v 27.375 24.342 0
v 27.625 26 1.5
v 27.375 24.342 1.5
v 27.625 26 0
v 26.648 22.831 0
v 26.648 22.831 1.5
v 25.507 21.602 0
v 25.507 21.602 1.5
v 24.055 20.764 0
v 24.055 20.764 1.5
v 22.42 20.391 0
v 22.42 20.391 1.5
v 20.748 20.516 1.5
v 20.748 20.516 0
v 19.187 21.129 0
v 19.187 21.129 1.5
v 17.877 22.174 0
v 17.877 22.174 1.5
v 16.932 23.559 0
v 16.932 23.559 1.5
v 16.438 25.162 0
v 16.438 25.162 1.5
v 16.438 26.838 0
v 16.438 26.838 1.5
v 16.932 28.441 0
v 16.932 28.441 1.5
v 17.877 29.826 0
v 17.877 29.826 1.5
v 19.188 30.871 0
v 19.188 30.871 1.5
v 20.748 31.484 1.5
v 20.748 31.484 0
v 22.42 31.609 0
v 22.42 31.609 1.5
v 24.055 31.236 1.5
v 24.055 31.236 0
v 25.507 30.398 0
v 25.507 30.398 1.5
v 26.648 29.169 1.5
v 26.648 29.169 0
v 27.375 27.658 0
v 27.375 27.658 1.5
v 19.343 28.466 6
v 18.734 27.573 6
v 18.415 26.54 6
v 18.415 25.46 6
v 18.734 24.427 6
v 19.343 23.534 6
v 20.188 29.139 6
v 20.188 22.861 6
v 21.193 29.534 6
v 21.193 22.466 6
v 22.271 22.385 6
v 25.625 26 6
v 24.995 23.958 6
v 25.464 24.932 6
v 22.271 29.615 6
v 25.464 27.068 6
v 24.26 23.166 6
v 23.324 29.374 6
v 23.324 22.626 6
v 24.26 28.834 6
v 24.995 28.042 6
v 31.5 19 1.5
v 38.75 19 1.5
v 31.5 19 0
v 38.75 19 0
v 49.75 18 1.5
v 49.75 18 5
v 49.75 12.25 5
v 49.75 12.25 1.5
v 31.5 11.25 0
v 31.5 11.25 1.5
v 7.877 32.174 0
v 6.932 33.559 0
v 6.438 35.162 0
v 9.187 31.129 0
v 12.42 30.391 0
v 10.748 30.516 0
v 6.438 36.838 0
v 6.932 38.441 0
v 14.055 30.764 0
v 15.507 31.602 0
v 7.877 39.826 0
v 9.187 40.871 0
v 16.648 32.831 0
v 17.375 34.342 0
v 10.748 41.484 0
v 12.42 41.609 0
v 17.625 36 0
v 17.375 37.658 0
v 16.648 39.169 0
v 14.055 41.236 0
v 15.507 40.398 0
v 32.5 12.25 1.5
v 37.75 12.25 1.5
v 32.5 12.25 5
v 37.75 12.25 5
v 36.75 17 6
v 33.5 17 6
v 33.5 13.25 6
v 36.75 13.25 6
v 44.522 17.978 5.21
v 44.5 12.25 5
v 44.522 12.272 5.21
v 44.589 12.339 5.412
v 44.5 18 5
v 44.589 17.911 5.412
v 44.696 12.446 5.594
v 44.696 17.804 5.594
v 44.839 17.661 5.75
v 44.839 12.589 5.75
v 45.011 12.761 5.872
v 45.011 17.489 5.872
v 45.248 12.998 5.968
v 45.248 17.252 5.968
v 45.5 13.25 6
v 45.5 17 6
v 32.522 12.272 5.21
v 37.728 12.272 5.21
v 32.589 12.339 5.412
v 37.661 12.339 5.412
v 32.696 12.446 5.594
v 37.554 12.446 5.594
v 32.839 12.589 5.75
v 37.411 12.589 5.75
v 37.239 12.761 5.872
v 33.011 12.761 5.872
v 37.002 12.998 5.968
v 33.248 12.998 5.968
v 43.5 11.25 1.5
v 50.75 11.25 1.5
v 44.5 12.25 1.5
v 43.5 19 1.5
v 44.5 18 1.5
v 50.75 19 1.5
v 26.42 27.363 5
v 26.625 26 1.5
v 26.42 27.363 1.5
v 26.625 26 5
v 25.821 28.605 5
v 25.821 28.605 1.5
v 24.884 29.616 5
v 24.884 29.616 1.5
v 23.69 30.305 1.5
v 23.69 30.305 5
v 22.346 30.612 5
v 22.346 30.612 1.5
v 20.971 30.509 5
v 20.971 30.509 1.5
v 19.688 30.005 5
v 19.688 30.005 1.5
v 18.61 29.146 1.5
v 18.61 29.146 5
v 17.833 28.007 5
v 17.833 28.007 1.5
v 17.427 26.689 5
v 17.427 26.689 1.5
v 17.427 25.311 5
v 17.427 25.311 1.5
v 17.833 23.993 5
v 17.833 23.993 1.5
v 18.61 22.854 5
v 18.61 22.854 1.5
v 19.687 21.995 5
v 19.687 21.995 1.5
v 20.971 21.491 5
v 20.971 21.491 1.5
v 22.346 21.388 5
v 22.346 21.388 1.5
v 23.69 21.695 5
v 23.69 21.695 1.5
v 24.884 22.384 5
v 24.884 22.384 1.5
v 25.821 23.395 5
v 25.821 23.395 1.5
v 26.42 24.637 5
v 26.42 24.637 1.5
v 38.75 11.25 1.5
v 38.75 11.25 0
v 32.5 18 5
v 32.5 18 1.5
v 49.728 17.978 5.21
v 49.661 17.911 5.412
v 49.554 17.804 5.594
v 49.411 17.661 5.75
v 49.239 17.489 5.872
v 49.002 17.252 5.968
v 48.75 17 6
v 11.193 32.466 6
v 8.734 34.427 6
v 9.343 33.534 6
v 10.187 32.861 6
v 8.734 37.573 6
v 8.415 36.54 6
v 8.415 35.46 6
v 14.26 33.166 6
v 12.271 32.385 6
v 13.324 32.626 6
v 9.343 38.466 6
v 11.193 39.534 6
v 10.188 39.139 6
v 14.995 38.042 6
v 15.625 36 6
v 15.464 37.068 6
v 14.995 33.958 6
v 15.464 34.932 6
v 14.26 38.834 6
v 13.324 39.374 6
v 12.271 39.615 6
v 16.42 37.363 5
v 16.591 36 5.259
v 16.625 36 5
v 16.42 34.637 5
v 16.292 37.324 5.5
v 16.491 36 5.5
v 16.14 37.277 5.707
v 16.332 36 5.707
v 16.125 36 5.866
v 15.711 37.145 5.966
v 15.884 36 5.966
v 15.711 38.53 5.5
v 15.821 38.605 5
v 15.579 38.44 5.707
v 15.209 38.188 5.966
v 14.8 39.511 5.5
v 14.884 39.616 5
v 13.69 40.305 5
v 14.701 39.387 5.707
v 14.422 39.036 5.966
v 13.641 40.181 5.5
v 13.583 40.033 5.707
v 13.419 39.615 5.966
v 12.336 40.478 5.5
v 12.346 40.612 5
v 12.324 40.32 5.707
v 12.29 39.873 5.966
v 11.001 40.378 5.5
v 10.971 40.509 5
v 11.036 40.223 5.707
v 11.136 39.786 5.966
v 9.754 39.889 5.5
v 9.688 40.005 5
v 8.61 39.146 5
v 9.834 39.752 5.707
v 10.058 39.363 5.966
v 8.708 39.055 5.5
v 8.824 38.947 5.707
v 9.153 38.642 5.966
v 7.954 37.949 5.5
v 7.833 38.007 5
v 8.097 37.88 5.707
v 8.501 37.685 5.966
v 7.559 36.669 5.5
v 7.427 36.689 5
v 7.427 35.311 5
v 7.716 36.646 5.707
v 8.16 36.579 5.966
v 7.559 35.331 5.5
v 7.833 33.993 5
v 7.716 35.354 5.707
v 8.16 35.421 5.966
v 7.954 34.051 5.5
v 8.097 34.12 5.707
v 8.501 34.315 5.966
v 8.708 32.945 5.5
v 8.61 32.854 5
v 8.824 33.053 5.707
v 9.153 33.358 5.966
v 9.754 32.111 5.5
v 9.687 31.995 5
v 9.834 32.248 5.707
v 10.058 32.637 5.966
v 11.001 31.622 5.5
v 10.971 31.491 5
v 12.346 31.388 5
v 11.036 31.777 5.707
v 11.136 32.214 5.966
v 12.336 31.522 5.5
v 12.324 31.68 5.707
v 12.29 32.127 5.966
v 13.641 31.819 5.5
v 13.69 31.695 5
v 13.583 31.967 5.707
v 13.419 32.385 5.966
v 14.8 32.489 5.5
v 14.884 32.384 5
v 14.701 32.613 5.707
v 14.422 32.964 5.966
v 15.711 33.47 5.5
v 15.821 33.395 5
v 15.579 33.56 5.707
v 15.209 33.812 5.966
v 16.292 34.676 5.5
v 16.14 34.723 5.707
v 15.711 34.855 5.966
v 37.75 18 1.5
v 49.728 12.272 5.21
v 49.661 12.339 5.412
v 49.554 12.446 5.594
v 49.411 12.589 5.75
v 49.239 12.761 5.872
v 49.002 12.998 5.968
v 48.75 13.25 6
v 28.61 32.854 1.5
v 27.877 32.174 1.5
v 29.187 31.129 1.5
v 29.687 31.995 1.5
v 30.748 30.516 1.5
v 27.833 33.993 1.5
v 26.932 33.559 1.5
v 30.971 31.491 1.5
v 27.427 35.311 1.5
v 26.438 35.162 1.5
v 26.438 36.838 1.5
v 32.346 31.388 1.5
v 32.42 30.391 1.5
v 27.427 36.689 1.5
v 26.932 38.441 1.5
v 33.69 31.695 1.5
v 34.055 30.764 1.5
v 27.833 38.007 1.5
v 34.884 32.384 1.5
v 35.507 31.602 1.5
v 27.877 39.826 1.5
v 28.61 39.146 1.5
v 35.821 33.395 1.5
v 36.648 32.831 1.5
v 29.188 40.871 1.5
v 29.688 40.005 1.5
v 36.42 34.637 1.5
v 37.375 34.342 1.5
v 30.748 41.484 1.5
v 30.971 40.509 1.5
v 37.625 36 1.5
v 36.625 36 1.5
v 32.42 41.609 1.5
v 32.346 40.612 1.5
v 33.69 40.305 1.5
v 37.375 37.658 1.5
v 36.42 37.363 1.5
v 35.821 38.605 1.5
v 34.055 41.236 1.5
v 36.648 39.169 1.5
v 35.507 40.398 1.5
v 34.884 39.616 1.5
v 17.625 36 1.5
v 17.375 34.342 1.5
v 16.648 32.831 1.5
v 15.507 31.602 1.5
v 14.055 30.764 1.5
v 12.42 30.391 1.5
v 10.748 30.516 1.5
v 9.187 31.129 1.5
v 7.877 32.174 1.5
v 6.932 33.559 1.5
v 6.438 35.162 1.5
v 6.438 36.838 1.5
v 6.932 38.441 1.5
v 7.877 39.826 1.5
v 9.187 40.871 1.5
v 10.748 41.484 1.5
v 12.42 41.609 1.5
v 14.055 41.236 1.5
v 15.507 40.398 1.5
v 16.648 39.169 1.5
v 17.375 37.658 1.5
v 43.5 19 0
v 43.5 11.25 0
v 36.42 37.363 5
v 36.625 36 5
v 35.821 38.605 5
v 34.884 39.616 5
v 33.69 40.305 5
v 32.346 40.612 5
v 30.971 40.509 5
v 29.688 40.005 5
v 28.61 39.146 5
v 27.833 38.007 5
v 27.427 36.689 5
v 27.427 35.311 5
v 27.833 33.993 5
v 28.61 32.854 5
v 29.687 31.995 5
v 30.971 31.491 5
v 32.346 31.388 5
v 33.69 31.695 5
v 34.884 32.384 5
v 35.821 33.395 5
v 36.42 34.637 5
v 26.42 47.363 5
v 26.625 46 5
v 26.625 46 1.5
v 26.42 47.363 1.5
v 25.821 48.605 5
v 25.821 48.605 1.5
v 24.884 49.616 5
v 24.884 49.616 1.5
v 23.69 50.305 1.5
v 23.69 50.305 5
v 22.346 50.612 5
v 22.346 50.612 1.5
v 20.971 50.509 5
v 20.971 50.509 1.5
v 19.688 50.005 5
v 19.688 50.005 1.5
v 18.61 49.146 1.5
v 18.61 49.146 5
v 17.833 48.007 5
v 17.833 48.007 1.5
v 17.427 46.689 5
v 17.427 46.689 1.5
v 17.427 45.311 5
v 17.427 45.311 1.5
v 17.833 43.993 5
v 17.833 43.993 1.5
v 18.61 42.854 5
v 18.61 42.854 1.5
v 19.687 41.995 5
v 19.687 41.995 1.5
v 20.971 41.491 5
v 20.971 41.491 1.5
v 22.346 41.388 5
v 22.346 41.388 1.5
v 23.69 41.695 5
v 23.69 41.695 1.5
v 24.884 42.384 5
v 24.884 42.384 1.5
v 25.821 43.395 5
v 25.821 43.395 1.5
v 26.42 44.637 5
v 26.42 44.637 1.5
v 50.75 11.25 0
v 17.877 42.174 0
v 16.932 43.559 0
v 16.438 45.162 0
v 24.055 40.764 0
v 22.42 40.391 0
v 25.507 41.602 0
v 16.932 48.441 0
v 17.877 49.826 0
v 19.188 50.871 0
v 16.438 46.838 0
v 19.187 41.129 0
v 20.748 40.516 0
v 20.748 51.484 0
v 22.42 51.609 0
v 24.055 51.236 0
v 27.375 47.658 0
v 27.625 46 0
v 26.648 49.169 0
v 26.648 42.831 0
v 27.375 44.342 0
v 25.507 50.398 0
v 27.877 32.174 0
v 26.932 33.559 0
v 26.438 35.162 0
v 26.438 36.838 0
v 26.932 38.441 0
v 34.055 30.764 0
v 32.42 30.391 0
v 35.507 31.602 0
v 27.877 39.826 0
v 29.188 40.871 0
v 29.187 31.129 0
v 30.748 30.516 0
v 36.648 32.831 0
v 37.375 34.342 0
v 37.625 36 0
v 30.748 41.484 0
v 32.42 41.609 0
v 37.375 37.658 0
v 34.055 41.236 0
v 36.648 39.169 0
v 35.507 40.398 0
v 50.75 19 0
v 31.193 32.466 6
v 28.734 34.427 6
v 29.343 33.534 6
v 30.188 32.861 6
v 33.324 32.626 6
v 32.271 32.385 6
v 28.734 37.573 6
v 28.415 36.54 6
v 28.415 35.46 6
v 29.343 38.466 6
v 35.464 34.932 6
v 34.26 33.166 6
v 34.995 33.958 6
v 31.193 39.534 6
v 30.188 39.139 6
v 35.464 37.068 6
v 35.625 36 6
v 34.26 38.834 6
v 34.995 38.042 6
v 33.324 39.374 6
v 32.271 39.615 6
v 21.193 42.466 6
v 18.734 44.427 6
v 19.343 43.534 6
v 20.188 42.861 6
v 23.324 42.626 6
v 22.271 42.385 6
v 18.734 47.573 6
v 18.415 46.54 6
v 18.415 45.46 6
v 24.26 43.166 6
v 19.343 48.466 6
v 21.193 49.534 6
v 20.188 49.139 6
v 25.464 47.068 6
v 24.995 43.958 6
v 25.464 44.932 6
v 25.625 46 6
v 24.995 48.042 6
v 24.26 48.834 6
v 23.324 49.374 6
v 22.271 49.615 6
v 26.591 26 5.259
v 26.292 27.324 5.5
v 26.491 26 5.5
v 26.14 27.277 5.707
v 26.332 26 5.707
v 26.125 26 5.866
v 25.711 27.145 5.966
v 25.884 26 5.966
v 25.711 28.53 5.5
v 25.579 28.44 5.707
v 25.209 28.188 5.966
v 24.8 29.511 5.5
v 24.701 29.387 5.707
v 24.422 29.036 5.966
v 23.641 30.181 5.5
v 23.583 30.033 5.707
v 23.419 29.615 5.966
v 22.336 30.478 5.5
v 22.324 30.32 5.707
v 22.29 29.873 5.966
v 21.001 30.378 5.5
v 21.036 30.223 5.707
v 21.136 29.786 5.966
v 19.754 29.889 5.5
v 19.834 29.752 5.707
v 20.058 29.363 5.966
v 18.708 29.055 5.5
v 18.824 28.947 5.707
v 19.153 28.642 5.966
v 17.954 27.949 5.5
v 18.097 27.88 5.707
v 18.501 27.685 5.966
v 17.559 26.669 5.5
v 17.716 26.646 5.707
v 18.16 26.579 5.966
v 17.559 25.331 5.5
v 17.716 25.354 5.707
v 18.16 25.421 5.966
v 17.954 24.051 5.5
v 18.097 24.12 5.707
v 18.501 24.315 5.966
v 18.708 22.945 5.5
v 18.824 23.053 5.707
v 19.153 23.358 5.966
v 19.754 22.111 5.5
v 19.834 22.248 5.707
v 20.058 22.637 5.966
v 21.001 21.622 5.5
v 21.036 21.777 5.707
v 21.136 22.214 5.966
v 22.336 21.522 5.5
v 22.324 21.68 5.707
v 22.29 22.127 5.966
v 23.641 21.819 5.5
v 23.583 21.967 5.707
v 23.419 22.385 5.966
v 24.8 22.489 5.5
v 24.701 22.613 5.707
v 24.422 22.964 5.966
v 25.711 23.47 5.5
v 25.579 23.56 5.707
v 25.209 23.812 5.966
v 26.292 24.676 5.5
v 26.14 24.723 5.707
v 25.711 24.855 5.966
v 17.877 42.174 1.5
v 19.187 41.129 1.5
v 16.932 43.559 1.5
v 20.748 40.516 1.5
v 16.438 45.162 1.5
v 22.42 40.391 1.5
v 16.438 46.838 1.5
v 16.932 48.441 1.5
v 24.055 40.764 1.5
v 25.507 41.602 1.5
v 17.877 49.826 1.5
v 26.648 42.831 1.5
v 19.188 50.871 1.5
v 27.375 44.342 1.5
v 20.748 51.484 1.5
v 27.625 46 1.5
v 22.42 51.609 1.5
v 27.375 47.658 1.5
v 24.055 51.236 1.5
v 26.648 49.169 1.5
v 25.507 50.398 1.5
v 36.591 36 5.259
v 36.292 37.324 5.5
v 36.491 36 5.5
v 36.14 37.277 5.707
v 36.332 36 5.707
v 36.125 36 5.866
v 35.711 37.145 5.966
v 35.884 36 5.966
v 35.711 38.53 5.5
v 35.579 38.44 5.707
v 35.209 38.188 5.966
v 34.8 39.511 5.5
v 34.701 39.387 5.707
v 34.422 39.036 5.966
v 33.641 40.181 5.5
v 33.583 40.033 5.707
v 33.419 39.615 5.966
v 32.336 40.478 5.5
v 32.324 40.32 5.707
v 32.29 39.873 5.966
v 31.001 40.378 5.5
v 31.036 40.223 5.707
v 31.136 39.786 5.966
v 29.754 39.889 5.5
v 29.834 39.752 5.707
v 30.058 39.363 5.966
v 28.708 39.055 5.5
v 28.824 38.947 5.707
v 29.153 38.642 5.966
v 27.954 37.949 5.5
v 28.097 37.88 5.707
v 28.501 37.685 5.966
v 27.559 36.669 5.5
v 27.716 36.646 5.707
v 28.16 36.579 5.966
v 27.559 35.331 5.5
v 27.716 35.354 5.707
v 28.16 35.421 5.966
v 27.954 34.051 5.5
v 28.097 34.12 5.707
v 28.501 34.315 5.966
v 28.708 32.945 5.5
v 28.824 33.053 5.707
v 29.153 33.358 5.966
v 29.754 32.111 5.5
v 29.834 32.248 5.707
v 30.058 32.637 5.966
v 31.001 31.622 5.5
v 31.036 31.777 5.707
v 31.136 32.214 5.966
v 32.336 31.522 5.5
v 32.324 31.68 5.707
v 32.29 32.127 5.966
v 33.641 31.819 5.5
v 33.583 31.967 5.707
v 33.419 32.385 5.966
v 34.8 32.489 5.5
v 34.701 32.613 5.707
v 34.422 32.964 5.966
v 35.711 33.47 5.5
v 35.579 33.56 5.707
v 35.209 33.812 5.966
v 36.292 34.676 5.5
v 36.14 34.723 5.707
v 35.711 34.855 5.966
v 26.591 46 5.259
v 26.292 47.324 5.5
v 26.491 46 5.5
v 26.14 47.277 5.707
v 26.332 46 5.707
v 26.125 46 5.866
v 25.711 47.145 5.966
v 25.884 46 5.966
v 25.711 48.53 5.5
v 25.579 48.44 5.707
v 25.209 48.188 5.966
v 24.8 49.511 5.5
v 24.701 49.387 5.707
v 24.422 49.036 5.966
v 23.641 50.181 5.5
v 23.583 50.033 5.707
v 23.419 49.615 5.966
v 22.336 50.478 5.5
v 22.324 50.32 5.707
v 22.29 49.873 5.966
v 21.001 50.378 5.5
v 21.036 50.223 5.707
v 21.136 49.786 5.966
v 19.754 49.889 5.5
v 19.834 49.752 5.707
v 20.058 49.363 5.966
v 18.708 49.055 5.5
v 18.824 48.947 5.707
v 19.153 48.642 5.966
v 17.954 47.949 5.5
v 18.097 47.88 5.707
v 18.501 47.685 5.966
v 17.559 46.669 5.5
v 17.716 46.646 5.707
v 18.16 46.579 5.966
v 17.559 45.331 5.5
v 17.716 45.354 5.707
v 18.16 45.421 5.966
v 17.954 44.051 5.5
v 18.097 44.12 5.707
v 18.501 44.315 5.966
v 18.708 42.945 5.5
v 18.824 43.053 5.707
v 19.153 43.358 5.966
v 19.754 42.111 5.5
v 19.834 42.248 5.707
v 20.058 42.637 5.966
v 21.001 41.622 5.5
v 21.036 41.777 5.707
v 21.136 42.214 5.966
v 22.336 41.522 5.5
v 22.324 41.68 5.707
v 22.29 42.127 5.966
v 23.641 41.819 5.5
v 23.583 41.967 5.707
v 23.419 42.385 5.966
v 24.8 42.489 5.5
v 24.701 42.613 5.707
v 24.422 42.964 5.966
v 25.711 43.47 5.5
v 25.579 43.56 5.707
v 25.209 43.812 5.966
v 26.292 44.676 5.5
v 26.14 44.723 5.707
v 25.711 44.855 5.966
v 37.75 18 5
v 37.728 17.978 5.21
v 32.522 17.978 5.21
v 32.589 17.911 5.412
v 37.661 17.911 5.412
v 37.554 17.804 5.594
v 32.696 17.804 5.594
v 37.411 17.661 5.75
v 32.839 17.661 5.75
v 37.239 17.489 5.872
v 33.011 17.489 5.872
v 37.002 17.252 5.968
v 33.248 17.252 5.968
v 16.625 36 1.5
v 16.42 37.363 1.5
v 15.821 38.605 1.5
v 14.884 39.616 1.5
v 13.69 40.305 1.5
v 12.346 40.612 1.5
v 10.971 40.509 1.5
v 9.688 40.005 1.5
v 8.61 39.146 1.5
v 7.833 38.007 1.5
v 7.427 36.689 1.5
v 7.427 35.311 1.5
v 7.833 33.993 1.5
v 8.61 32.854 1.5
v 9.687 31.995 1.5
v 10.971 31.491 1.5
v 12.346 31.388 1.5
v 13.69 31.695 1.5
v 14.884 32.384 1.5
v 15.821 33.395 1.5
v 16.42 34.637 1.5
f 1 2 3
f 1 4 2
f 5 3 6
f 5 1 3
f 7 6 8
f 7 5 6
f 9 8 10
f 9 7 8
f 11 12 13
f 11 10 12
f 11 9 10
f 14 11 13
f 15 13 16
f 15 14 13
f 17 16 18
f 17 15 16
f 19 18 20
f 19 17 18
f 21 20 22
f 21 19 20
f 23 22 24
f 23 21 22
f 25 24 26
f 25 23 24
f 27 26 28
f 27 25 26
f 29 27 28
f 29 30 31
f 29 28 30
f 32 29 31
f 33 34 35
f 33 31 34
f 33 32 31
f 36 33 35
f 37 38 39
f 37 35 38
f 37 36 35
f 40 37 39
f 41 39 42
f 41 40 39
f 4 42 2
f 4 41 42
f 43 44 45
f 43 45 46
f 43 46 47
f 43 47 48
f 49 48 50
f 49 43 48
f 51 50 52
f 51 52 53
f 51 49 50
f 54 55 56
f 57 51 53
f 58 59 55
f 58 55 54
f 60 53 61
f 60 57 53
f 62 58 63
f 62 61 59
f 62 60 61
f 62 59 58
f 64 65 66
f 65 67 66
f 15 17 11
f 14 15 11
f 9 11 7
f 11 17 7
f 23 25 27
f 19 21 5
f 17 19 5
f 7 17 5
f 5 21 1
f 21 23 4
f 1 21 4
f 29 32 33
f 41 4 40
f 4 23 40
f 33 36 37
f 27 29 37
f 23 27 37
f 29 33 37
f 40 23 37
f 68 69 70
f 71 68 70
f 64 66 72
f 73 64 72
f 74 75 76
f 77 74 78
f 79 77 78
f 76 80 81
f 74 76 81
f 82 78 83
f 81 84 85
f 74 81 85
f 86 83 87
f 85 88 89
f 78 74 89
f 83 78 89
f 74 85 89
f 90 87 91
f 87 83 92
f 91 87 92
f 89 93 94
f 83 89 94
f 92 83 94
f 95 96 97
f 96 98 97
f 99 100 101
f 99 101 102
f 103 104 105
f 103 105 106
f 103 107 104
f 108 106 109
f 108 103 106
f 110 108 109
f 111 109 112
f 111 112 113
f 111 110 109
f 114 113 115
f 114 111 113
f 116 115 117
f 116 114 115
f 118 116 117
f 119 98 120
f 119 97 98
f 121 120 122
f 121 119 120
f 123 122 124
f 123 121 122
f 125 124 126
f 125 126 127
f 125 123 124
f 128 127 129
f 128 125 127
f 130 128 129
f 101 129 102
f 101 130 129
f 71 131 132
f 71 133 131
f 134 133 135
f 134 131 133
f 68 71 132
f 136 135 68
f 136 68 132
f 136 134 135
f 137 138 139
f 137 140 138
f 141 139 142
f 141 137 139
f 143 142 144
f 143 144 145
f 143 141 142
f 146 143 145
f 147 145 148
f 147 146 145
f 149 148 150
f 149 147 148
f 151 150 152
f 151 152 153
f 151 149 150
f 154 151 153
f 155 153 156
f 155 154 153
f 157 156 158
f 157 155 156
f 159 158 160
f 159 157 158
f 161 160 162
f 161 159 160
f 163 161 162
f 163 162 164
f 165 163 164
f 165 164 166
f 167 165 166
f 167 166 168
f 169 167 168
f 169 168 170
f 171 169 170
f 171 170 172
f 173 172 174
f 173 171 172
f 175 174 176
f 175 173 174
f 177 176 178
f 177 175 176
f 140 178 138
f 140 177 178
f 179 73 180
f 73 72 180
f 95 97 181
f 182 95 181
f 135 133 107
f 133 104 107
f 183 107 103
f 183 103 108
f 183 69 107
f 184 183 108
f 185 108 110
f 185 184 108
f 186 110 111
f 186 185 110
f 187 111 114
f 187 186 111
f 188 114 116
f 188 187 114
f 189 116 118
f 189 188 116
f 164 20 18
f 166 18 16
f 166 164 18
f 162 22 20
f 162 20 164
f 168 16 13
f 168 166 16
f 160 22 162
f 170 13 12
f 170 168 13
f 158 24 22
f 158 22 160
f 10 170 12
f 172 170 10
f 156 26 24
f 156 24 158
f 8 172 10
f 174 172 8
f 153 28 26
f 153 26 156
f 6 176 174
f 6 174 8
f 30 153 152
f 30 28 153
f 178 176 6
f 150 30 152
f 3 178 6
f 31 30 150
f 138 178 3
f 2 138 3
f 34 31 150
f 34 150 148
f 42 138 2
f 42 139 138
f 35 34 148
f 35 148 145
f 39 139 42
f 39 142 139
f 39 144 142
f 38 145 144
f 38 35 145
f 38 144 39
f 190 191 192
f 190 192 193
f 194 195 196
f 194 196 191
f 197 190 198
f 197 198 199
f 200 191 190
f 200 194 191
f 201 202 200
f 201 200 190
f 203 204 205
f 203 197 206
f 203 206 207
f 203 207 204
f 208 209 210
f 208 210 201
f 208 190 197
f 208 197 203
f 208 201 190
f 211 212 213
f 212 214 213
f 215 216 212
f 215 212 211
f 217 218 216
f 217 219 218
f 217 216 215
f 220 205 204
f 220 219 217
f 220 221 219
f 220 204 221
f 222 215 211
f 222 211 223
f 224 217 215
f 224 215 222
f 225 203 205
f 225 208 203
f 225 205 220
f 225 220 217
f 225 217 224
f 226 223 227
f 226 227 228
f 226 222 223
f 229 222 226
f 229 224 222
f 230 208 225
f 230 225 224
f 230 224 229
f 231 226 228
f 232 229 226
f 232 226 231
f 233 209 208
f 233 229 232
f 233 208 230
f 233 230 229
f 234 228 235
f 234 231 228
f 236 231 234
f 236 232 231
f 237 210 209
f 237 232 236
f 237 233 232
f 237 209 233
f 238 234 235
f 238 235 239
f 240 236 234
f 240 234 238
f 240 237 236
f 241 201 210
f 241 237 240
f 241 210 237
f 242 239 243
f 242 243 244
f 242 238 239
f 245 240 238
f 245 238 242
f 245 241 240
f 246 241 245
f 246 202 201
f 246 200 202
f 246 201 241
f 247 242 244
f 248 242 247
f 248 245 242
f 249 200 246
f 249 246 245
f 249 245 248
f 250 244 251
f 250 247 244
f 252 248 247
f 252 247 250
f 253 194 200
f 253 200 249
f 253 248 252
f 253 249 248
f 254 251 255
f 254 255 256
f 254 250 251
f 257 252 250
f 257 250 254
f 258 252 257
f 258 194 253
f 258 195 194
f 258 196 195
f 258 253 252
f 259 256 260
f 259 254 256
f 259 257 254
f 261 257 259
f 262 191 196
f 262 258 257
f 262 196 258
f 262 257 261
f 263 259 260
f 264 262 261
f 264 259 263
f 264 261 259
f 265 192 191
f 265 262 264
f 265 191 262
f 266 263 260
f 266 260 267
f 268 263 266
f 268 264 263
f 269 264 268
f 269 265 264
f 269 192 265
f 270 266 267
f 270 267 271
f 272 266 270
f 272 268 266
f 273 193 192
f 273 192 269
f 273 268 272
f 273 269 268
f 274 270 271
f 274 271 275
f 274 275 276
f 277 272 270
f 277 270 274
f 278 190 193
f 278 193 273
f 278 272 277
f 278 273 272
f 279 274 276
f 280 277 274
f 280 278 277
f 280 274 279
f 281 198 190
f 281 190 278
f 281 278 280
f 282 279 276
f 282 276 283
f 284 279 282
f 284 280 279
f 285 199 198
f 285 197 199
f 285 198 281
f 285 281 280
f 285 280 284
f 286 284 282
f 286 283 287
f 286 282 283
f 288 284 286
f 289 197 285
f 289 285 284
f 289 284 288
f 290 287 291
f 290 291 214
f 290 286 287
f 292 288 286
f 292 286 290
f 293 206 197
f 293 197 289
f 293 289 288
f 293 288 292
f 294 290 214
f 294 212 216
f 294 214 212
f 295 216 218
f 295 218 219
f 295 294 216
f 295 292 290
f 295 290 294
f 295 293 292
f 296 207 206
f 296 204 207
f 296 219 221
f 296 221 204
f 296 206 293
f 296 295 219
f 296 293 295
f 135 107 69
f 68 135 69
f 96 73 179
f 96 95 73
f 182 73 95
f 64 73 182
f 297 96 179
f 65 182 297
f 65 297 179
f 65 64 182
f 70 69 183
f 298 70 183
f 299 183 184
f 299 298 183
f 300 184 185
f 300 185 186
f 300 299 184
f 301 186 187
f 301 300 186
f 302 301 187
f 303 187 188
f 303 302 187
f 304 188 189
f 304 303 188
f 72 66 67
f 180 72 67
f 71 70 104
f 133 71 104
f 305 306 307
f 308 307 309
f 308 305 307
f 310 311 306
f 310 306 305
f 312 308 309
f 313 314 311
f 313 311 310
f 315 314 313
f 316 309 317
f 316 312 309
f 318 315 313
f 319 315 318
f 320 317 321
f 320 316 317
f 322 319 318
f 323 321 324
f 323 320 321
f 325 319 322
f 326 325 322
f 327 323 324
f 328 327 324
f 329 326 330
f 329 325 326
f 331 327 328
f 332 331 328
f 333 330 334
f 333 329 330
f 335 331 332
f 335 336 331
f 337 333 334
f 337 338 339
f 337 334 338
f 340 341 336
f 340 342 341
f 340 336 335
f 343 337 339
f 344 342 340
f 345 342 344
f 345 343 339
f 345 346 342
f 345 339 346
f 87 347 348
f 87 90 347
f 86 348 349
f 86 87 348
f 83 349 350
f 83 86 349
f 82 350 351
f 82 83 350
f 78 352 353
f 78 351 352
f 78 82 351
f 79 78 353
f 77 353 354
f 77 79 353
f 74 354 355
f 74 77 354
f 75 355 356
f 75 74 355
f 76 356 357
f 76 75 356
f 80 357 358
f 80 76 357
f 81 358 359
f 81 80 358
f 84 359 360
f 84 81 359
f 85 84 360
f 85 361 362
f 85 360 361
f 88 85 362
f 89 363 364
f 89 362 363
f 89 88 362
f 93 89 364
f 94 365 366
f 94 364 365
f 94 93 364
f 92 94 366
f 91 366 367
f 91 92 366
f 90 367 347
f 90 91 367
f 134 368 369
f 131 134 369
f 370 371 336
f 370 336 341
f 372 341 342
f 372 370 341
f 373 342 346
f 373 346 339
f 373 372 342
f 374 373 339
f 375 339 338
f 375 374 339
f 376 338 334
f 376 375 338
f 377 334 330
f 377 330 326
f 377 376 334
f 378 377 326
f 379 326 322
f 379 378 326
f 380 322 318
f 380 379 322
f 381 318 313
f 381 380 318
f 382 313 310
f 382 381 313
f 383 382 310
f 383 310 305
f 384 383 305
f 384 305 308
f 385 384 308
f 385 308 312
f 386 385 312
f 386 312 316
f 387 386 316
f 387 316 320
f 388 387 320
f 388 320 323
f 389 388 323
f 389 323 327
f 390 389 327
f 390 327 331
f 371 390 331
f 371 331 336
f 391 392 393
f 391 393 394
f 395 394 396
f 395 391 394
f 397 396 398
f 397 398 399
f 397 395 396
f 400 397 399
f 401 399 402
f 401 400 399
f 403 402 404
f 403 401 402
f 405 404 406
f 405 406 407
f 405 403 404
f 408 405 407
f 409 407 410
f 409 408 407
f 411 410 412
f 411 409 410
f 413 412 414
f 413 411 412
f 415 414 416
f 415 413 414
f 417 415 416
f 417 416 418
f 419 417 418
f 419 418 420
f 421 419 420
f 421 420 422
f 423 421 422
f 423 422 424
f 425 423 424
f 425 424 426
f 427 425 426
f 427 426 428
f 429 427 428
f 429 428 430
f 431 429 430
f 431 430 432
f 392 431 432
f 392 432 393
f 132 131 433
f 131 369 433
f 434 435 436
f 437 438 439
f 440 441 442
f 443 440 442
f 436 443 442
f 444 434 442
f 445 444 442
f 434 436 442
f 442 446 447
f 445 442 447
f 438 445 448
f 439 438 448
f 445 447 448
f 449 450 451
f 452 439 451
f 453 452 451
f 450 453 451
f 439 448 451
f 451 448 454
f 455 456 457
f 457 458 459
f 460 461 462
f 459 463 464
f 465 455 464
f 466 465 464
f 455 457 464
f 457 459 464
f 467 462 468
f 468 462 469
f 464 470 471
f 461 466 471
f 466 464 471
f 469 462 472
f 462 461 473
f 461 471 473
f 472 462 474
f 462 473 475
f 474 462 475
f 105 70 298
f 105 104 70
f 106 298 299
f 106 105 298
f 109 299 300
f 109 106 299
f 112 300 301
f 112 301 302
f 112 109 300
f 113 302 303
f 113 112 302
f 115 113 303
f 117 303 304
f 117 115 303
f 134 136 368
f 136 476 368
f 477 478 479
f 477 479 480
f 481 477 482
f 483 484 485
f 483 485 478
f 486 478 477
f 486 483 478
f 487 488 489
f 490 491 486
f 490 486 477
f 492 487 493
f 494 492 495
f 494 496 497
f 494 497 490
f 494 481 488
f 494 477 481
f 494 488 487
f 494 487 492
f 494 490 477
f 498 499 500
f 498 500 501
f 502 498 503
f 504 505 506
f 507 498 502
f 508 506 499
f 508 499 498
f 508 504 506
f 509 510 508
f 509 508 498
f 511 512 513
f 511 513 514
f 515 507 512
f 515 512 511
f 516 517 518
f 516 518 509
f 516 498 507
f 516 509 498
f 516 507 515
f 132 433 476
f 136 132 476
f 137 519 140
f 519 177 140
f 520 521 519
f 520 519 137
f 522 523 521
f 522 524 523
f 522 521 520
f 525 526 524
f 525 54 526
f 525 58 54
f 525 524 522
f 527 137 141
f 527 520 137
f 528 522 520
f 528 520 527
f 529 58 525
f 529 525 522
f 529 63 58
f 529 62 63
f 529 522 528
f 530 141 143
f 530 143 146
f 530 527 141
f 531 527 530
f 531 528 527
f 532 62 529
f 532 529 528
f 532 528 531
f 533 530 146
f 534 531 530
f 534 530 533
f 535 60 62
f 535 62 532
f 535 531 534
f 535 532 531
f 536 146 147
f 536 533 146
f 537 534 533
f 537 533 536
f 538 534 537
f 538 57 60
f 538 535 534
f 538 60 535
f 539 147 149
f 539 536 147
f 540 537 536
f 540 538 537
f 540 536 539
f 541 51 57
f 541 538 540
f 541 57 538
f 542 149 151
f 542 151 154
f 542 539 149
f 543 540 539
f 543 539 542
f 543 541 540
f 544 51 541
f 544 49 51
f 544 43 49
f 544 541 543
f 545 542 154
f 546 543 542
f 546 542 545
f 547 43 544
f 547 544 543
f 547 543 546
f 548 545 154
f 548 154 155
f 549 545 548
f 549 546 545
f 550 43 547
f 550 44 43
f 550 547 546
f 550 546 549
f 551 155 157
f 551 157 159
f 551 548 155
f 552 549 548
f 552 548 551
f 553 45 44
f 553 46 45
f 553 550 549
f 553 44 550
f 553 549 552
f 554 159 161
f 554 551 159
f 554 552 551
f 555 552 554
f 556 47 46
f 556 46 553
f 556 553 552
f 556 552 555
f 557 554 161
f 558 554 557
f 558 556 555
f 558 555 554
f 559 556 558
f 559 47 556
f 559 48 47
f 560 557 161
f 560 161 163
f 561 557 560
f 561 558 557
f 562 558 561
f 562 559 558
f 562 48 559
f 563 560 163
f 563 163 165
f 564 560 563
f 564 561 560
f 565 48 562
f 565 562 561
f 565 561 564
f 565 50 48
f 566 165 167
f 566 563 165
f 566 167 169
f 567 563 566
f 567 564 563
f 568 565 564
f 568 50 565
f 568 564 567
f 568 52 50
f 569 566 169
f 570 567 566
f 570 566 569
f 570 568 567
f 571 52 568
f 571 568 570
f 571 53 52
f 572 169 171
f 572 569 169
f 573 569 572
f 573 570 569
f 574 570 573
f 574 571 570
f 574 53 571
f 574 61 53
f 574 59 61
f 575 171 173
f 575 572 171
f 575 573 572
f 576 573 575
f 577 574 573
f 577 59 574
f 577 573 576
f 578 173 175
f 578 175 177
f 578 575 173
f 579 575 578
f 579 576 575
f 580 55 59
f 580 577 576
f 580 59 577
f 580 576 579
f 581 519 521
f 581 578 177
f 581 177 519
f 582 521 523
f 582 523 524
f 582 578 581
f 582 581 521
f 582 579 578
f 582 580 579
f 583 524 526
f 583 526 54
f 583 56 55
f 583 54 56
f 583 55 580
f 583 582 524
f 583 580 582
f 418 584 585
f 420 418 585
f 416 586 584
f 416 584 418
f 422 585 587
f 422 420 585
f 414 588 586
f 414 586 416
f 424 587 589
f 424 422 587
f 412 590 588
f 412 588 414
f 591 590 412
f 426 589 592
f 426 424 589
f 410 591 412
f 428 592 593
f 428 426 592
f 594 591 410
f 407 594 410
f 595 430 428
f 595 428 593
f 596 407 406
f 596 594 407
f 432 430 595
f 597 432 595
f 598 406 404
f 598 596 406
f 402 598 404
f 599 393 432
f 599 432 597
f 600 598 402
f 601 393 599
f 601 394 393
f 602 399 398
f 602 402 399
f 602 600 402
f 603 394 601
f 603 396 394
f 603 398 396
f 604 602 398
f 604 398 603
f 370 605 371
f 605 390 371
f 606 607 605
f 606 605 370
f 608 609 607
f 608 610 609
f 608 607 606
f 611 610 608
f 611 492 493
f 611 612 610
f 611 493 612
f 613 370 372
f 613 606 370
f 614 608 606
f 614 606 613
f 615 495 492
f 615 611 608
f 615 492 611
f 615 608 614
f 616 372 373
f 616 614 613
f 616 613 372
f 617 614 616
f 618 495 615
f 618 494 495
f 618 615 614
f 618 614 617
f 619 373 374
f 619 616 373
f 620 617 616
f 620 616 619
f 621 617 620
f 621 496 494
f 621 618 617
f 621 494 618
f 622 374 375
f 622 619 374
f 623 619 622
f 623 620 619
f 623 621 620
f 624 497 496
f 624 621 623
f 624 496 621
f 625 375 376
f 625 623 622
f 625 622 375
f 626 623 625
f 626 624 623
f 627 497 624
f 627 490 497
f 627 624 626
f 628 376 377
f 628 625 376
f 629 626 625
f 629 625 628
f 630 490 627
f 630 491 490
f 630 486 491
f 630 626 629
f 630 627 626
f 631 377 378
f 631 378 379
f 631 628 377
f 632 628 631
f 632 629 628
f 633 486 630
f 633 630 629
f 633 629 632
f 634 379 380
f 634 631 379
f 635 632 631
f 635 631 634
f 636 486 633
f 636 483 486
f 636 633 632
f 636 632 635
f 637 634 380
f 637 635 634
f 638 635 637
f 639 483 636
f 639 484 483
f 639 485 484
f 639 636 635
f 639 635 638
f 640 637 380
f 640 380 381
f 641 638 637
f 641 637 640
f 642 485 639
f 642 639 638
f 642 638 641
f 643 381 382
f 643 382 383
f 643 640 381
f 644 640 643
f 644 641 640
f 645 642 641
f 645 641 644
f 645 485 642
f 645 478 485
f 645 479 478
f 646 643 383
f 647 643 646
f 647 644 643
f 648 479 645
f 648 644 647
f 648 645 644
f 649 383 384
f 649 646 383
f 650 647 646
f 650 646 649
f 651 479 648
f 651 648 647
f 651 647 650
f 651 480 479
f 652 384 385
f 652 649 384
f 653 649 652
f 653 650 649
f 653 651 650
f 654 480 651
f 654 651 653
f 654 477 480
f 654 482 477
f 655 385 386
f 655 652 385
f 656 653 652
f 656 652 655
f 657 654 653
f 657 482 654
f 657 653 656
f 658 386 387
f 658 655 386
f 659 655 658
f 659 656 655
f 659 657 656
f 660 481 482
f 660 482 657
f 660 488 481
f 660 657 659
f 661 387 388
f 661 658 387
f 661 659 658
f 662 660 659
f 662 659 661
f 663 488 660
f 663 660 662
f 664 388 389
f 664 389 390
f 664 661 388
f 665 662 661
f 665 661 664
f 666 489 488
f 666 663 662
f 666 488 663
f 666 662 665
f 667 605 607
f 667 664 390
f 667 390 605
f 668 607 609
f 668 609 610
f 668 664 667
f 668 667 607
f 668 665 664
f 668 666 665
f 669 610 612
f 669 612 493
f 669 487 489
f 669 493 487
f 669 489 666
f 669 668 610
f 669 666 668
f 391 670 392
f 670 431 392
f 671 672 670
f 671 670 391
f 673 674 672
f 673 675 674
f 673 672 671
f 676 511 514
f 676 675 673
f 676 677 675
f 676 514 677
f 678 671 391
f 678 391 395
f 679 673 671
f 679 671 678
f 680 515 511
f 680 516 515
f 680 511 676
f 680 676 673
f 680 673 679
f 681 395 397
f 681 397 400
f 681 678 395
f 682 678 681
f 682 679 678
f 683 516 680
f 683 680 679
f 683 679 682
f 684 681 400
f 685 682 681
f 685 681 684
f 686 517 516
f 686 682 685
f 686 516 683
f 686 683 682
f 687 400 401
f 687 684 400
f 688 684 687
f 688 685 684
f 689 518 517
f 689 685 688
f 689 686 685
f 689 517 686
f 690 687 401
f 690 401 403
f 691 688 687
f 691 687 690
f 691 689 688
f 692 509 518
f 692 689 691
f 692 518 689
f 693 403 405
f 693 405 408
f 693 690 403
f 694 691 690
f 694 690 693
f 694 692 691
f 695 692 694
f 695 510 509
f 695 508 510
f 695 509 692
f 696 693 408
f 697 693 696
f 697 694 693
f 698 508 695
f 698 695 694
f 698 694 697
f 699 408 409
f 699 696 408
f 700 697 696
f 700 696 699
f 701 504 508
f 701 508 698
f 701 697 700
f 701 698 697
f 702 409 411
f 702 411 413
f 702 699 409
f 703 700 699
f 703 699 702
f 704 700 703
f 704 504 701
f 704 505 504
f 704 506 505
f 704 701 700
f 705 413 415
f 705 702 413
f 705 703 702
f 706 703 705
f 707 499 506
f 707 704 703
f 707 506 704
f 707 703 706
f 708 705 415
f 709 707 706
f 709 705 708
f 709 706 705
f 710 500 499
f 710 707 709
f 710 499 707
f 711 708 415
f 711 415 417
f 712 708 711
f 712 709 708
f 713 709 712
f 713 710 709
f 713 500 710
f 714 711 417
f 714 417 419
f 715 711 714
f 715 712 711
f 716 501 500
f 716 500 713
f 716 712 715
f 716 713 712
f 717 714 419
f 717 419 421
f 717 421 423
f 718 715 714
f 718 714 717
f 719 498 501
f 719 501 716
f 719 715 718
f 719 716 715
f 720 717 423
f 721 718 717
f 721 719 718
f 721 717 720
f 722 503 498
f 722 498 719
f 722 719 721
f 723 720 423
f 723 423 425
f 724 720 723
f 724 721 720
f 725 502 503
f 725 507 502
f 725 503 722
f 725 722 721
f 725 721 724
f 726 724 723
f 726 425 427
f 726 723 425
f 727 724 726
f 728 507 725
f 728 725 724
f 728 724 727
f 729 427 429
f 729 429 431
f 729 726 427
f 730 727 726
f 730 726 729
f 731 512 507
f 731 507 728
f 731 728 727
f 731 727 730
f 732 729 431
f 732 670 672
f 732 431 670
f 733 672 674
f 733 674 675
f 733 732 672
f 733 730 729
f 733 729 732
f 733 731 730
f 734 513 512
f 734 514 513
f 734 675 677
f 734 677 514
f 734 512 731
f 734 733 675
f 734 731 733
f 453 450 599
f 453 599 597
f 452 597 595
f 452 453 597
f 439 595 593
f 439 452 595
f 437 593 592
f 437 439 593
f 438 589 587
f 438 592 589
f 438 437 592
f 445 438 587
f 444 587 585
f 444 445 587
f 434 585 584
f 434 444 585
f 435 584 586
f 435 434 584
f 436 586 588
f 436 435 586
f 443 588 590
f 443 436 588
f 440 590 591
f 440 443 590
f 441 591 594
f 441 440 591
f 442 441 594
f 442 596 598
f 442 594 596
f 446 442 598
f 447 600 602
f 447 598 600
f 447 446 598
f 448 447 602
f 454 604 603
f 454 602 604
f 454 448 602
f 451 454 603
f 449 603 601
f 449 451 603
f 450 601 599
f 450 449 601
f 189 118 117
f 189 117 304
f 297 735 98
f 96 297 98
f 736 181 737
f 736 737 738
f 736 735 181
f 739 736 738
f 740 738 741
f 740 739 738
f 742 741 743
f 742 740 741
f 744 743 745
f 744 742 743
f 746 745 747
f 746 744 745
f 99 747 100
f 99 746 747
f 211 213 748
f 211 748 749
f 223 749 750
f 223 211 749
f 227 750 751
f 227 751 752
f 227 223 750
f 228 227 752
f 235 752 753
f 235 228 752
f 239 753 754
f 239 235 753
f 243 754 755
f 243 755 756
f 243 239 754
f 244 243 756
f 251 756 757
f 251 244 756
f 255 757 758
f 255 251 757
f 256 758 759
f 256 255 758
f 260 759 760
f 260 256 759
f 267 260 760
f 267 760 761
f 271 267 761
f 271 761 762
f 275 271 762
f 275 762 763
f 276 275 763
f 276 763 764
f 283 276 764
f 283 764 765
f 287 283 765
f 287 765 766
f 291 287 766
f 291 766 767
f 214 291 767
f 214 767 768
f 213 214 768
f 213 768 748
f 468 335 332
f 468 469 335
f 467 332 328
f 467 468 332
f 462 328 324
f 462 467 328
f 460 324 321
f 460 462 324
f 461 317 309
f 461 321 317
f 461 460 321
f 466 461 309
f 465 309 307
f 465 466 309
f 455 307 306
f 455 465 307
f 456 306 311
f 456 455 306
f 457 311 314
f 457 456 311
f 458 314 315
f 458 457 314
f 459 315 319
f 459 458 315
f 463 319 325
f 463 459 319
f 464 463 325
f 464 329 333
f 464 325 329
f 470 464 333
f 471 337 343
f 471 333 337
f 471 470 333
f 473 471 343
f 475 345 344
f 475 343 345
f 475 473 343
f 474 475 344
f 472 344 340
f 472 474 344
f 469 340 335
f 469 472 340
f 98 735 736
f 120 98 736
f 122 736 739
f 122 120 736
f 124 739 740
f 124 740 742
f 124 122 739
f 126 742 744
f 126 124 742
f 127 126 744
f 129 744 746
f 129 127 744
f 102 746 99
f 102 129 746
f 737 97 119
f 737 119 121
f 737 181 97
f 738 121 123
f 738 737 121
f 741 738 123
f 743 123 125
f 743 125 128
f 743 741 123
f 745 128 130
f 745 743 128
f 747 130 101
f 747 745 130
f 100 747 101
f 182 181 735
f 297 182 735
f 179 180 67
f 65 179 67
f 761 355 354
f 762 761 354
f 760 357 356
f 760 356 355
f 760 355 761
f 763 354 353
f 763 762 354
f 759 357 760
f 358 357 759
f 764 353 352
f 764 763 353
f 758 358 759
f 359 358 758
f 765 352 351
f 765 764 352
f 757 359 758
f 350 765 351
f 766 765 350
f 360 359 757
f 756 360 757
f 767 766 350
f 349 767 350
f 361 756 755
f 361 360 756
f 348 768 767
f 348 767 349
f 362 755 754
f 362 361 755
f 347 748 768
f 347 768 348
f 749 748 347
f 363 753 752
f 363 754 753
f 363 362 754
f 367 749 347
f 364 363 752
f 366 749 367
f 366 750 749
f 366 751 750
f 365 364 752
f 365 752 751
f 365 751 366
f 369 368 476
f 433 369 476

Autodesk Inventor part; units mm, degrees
ref_plane "YZ Plane" through (0, 0, 0) normal (1, 0, 0) x (0, 1, 0)
ref_plane "XZ Plane" through (0, 0, 0) normal (0, 1, 0) x (-1, 0, 0)
ref_plane "XY Plane" through (0, 0, 0) normal (0, 0, 1) x (1, 0, 0)
sketch "Sketch1" plane through (0, 0, 0) normal (0, 0, 1) x (1, 0, 0)
  circle A0 centre (22, 46) radius 4.5
  circle A1 centre (12, 36) radius 4.5
  circle A2 centre (22, 26) radius 4.5
  circle A3 centre (32, 36) radius 4.5
  line L0 (37.75, 18) -> (32.5, 18)
  line L1 (32.5, 18) -> (32.5, 12.25)
  line L2 (32.5, 12.25) -> (37.75, 12.25)
  line L3 (37.75, 12.25) -> (37.75, 18)
  line L4 (44.5, 18) -> (49.75, 18)
  line L5 (49.75, 18) -> (49.75, 12.25)
  line L6 (49.75, 12.25) -> (44.5, 12.25)
  line L7 (44.5, 12.25) -> (44.5, 18)
  circle A4 centre (12, 36) radius 5.625
  circle A5 centre (22, 46) radius 5.625
  circle A6 centre (32, 36) radius 5.625
  circle A7 centre (22, 26) radius 5.625
  line L8 (38.75, 19) -> (31.5, 19)
  line L9 (31.5, 19) -> (31.5, 11.25)
  line L10 (31.5, 11.25) -> (38.75, 11.25)
  line L11 (38.75, 11.25) -> (38.75, 19)
  line L12 (50.75, 19) -> (43.5, 19)
  line L13 (43.5, 19) -> (43.5, 11.25)
  line L14 (43.5, 11.25) -> (50.75, 11.25)
  line L15 (50.75, 11.25) -> (50.75, 19)
  point P0 (18.75, 39)
  point P1 (18.75, 32.5)
  dimension "d35" = 11.25
  dimension "d36" = 11.25
  dimension "d37" = 11.25
  dimension "d38" = 11.25
  dimension "d43" = 7.75
  dimension "d44" = 7.75
  dimension "d45" = 7.25
  dimension "d46" = 7.25
  dimension "d47" = 5.75
  dimension "d48" = 5.25
  dimension "d49" = 5.75
  dimension "d50" = 5.25
extrude "Extrusion1" add sketch "Sketch1" along normal blind 6 contours A0 | A1 | A2 | A3 | L3 L2 L1 L0 | L4 L5 L6 L7 | A4 | A5 | A6 | A7 | L11 L10 L9 L8 | L15 L14 L13 L12
sketch "Sketch2" plane through (0, 0, 6) normal (0, 0, 1) x (1, 0, 0)
  circle A0 centre (22, 46) radius 4.625
  circle A1 centre (12, 36) radius 4.625
  circle A2 centre (22, 26) radius 4.625
  circle A3 centre (32, 36) radius 4.625
  circle A4 centre (22, 46) radius 5.625
  circle A5 centre (12, 36) radius 5.625
  circle A6 centre (22, 26) radius 5.625
  circle A7 centre (32, 36) radius 5.625
  line L0 (31.5, 19) -> (31.5, 11.25) projected
  line L1 (38.75, 11.25) -> (38.75, 19) projected
  line L2 (31.5, 19) -> (38.75, 19)
  line L3 (38.75, 19) -> (38.75, 11.25)
  line L4 (38.75, 11.25) -> (31.5, 11.25)
  line L5 (31.5, 11.25) -> (31.5, 19)
  line L6 (50.75, 19) -> (43.5, 19) projected
  line L7 (43.5, 11.25) -> (50.75, 11.25) projected
  line L8 (43.5, 19) -> (50.75, 19)
  line L9 (50.75, 19) -> (50.75, 11.25)
  line L10 (50.75, 11.25) -> (43.5, 11.25)
  line L11 (43.5, 11.25) -> (43.5, 19)
  line L12 (37.75, 18) -> (32.5, 18)
  line L13 (32.5, 18) -> (32.5, 12.25)
  line L14 (32.5, 12.25) -> (37.75, 12.25)
  line L15 (37.75, 12.25) -> (37.75, 18)
  line L16 (44.5, 18) -> (49.75, 18)
  line L17 (49.75, 18) -> (49.75, 12.25)
  line L18 (49.75, 12.25) -> (44.5, 12.25)
  line L19 (44.5, 12.25) -> (44.5, 18)
  dimension "d16" = 1
  dimension "d17" = 1
  dimension "d18" = 1
  dimension "d19" = 1
  dimension "d39" = 11.25
  dimension "d40" = 11.25
  dimension "d41" = 11.25
  dimension "d42" = 11.25
  dimension "d51" = 1
  dimension "d52" = 1
extrude "Extrusion2" cut sketch "Sketch2" against normal blind 4.5 contours A4 | A5 | A6 | A7
fillet "Fillet2" radius 1 4 edges at (17.375, 46, 6) (27.375, 36, 6) (17.375, 26, 6) (7.375, 36, 6)
sketch "Sketch5" plane through (0, 0, 6) normal (0, 0, 1) x (1, 0, 0)
  line L0 (31.5, 19) -> (31.5, 11.25) projected
  line L1 (38.75, 11.25) -> (38.75, 19) projected
  line L2 (31.5, 11.25) -> (38.75, 11.25)
  line L3 (38.75, 11.25) -> (38.75, 19)
  line L4 (38.75, 19) -> (31.5, 19)
  line L5 (31.5, 19) -> (31.5, 11.25)
  line L6 (32.5, 18) -> (37.75, 18)
  line L7 (37.75, 18) -> (37.75, 12.25)
  line L8 (37.75, 12.25) -> (32.5, 12.25)
  line L9 (32.5, 12.25) -> (32.5, 18)
  line L10 (43.5, 11.25) -> (50.75, 11.25) projected
  line L11 (50.75, 11.25) -> (50.75, 19) projected
  line L12 (43.5, 11.25) -> (50.75, 11.25)
  line L13 (50.75, 11.25) -> (50.75, 19)
  line L14 (50.75, 19) -> (43.5, 19)
  line L15 (43.5, 19) -> (43.5, 11.25)
  line L16 (44.5, 18) -> (49.75, 18)
  line L17 (49.75, 18) -> (49.75, 12.25)
  line L18 (49.75, 12.25) -> (44.5, 12.25)
  line L19 (44.5, 12.25) -> (44.5, 18)
  point P0 (0, 0)
  point P1 (43.5, 19)
  dimension "d37" = 11.25
  dimension "d58" = 1
  dimension "d60" = 1
extrude "Extrusion5" cut sketch "Sketch5" against normal blind 4.5
fillet "Fillet5" radius 1 8 edges at (32.5, 15.125, 6) (35.125, 12.25, 6) (37.75, 15.125, 6) (35.125, 18, 6) (44.5, 15.125, 6) (47.125, 12.25, 6) (49.75, 15.125, 6) (47.125, 18, 6)
properties part number "Groboy Buttons"
